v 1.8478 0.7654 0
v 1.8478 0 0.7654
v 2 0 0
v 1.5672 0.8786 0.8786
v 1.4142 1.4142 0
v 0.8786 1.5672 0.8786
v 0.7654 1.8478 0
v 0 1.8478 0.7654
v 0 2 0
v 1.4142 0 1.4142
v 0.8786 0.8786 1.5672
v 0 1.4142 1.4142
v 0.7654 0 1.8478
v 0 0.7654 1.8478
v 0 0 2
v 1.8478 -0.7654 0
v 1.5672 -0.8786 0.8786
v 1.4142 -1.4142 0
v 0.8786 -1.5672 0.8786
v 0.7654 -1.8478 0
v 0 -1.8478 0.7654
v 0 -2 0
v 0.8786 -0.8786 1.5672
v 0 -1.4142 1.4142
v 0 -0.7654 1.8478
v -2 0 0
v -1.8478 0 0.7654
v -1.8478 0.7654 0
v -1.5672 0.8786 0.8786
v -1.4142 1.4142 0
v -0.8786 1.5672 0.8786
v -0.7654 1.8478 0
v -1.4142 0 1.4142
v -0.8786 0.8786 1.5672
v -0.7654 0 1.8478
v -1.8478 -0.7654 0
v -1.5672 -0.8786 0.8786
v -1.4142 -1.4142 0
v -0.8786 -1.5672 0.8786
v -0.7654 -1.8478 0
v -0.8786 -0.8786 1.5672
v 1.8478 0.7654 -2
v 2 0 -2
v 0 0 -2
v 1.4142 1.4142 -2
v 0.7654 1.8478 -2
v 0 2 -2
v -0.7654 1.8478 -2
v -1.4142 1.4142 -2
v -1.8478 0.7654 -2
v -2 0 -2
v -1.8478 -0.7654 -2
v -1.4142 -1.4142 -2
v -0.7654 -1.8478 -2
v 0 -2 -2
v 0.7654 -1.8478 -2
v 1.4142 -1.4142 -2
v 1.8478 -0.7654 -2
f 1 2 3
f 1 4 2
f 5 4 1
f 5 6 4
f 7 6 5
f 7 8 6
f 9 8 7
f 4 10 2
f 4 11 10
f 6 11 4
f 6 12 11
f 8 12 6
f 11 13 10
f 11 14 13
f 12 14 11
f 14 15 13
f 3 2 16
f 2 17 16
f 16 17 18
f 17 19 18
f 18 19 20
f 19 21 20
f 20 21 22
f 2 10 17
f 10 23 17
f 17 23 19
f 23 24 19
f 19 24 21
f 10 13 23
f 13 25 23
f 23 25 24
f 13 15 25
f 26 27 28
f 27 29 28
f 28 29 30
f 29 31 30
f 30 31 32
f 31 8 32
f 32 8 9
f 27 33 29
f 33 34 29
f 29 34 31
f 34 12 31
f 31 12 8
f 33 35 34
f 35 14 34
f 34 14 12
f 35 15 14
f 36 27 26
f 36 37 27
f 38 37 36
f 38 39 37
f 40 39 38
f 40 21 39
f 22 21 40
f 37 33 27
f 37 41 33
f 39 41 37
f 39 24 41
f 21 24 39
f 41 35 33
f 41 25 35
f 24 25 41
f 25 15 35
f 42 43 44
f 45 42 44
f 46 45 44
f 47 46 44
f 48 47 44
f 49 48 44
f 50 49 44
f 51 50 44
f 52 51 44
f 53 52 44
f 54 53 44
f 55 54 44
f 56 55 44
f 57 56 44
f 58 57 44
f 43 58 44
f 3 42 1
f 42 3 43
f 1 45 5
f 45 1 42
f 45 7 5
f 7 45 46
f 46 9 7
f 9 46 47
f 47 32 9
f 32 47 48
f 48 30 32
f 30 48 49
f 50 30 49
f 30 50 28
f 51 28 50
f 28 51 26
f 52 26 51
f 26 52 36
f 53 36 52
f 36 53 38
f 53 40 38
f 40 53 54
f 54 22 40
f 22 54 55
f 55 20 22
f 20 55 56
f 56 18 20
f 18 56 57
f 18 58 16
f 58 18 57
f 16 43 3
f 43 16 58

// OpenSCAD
// file: ../p/1-8sphe.scad
use <../lib.scad>
function ldraw_lib__1_8sphe() = [
// 0 Sphere 0.125
// 0 Name: 1-8sphe.dat
// 0 Author: James Jessiman
// 0 !LDRAW_ORG Primitive UPDATE 2012-03
// 0 !LICENSE Licensed under CC BY 2.0 and CC BY 4.0 : see CAreadme.txt
// 
// 0 BFC CERTIFY CCW
  [0,"BFC","CERTIFY"],
  [0,"BFC","CCW"],
// 
// 0 !HISTORY 2000-08-01 {Axel Poque} fixes to resolve L3P error messages.
// 0 !HISTORY 2000-08-01 {Manfred Moolhuysen} fixes to resolve L3P error messages.
// 0 !HISTORY 2000-09-30 [PTadmin] Official Update 2000-02
// 0 !HISTORY 2002-03-28 [hafhead] Made BFC compliant
// 0 !HISTORY 2002-04-25 [PTadmin] Official Update 2002-02
// 0 !HISTORY 2007-06-22 [PTadmin] Header formatted for Contributor Agreement
// 0 !HISTORY 2008-07-01 [PTadmin] Official Update 2008-01
// 0 !HISTORY 2010-09-12 [MagFors] Changed winding, removed duplicated cond-line, optimized filesize
// 0 !HISTORY 2010-12-31 [PTadmin] Official Update 2010-03
// 0 !HISTORY 2012-07-01 [tcobbs] Replaced with geometry from LDView
// 0 !HISTORY 2012-12-28 [PTadmin] Official Update 2012-03
// 
// 
// 3 16 1 0 0 0.9239 0.3827 0 0.9239 0 0.3827
  [3,16,1,0,0,0.9239,0.3827,0,0.9239,0,0.3827],
// 3 16 0.9239 0.3827 0 0.7836 0.4393 0.4393 0.9239 0 0.3827
  [3,16,0.9239,0.3827,0,0.7836,0.4393,0.4393,0.9239,0,0.3827],
// 3 16 0.9239 0 0.3827 0.7836 0.4393 0.4393 0.7071 0 0.7071
  [3,16,0.9239,0,0.3827,0.7836,0.4393,0.4393,0.7071,0,0.7071],
// 3 16 0.7836 0.4393 0.4393 0.4393 0.4393 0.7836 0.7071 0 0.7071
  [3,16,0.7836,0.4393,0.4393,0.4393,0.4393,0.7836,0.7071,0,0.7071],
// 3 16 0.7071 0 0.7071 0.4393 0.4393 0.7836 0.3827 0 0.9239
  [3,16,0.7071,0,0.7071,0.4393,0.4393,0.7836,0.3827,0,0.9239],
// 3 16 0.4393 0.4393 0.7836 0 0.3827 0.9239 0.3827 0 0.9239
  [3,16,0.4393,0.4393,0.7836,0,0.3827,0.9239,0.3827,0,0.9239],
// 3 16 0.3827 0 0.9239 0 0.3827 0.9239 0 0 1
  [3,16,0.3827,0,0.9239,0,0.3827,0.9239,0,0,1],
// 3 16 0.9239 0.3827 0 0.7071 0.7071 0 0.7836 0.4393 0.4393
  [3,16,0.9239,0.3827,0,0.7071,0.7071,0,0.7836,0.4393,0.4393],
// 3 16 0.7071 0.7071 0 0.4393 0.7836 0.4393 0.7836 0.4393 0.4393
  [3,16,0.7071,0.7071,0,0.4393,0.7836,0.4393,0.7836,0.4393,0.4393],
// 3 16 0.7836 0.4393 0.4393 0.4393 0.7836 0.4393 0.4393 0.4393 0.7836
  [3,16,0.7836,0.4393,0.4393,0.4393,0.7836,0.4393,0.4393,0.4393,0.7836],
// 3 16 0.4393 0.7836 0.4393 0 0.7071 0.7071 0.4393 0.4393 0.7836
  [3,16,0.4393,0.7836,0.4393,0,0.7071,0.7071,0.4393,0.4393,0.7836],
// 3 16 0.4393 0.4393 0.7836 0 0.7071 0.7071 0 0.3827 0.9239
  [3,16,0.4393,0.4393,0.7836,0,0.7071,0.7071,0,0.3827,0.9239],
// 3 16 0.7071 0.7071 0 0.3827 0.9239 0 0.4393 0.7836 0.4393
  [3,16,0.7071,0.7071,0,0.3827,0.9239,0,0.4393,0.7836,0.4393],
// 3 16 0.3827 0.9239 0 0 0.9239 0.3827 0.4393 0.7836 0.4393
  [3,16,0.3827,0.9239,0,0,0.9239,0.3827,0.4393,0.7836,0.4393],
// 3 16 0.4393 0.7836 0.4393 0 0.9239 0.3827 0 0.7071 0.7071
  [3,16,0.4393,0.7836,0.4393,0,0.9239,0.3827,0,0.7071,0.7071],
// 3 16 0.3827 0.9239 0 0 1 0 0 0.9239 0.3827
  [3,16,0.3827,0.9239,0,0,1,0,0,0.9239,0.3827],
// 
// 5 24 1 0 0 0.9239 0.3827 0 1 0 -0.1 0.9239 0 0.3827
  [5,24,1,0,0,0.9239,0.3827,0,1,0,-0.1,0.9239,0,0.3827],
// 5 24 0.9239 0.3827 0 0.9239 0 0.3827 1 0 0 0.7836 0.4393 0.4393
  [5,24,0.9239,0.3827,0,0.9239,0,0.3827,1,0,0,0.7836,0.4393,0.4393],
// 5 24 1 0 0 0.9239 0 0.3827 0.9239 0.3827 0 1 -0.1 0
  [5,24,1,0,0,0.9239,0,0.3827,0.9239,0.3827,0,1,-0.1,0],
// 5 24 0.9239 0 0.3827 0.7836 0.4393 0.4393 0.9239 0.3827 0 0.7071 0 0.7071
  [5,24,0.9239,0,0.3827,0.7836,0.4393,0.4393,0.9239,0.3827,0,0.7071,0,0.7071],
// 5 24 0.7836 0.4393 0.4393 0.7071 0 0.7071 0.9239 0 0.3827 0.4393 0.4393 0.7836
  [5,24,0.7836,0.4393,0.4393,0.7071,0,0.7071,0.9239,0,0.3827,0.4393,0.4393,0.7836],
// 5 24 0.9239 0 0.3827 0.7071 0 0.7071 0.7836 0.4393 0.4393 0.9239 -0.1 0.3827
  [5,24,0.9239,0,0.3827,0.7071,0,0.7071,0.7836,0.4393,0.4393,0.9239,-0.1,0.3827],
// 5 24 0.7071 0 0.7071 0.4393 0.4393 0.7836 0.7836 0.4393 0.4393 0.3827 0 0.9239
  [5,24,0.7071,0,0.7071,0.4393,0.4393,0.7836,0.7836,0.4393,0.4393,0.3827,0,0.9239],
// 5 24 0.4393 0.4393 0.7836 0.3827 0 0.9239 0.7071 0 0.7071 0 0.3827 0.9239
  [5,24,0.4393,0.4393,0.7836,0.3827,0,0.9239,0.7071,0,0.7071,0,0.3827,0.9239],
// 5 24 0.7071 0 0.7071 0.3827 0 0.9239 0.4393 0.4393 0.7836 0.7071 -0.1 0.7071
  [5,24,0.7071,0,0.7071,0.3827,0,0.9239,0.4393,0.4393,0.7836,0.7071,-0.1,0.7071],
// 5 24 0.3827 0 0.9239 0 0.3827 0.9239 0.4393 0.4393 0.7836 0 0 1
  [5,24,0.3827,0,0.9239,0,0.3827,0.9239,0.4393,0.4393,0.7836,0,0,1],
// 5 24 0 0.3827 0.9239 0 0 1 0.3827 0 0.9239 -0.1 0.3827 0.9239
  [5,24,0,0.3827,0.9239,0,0,1,0.3827,0,0.9239,-0.1,0.3827,0.9239],
// 5 24 0.3827 0 0.9239 0 0 1 0 0.3827 0.9239 0.3827 -0.1 0.9239
  [5,24,0.3827,0,0.9239,0,0,1,0,0.3827,0.9239,0.3827,-0.1,0.9239],
// 5 24 0.9239 0.3827 0 0.7071 0.7071 0 0.9239 0.3827 -0.1 0.7836 0.4393 0.4393
  [5,24,0.9239,0.3827,0,0.7071,0.7071,0,0.9239,0.3827,-0.1,0.7836,0.4393,0.4393],
// 5 24 0.7071 0.7071 0 0.7836 0.4393 0.4393 0.9239 0.3827 0 0.4393 0.7836 0.4393
  [5,24,0.7071,0.7071,0,0.7836,0.4393,0.4393,0.9239,0.3827,0,0.4393,0.7836,0.4393],
// 5 24 0.9239 0.3827 0 0.7836 0.4393 0.4393 0.7071 0.7071 0 0.9239 0 0.3827
  [5,24,0.9239,0.3827,0,0.7836,0.4393,0.4393,0.7071,0.7071,0,0.9239,0,0.3827],
// 5 24 0.7836 0.4393 0.4393 0.4393 0.7836 0.4393 0.7071 0.7071 0 0.4393 0.4393 0.7836
  [5,24,0.7836,0.4393,0.4393,0.4393,0.7836,0.4393,0.7071,0.7071,0,0.4393,0.4393,0.7836],
// 5 24 0.4393 0.7836 0.4393 0.4393 0.4393 0.7836 0.7836 0.4393 0.4393 0 0.7071 0.7071
  [5,24,0.4393,0.7836,0.4393,0.4393,0.4393,0.7836,0.7836,0.4393,0.4393,0,0.7071,0.7071],
// 5 24 0.7836 0.4393 0.4393 0.4393 0.4393 0.7836 0.4393 0.7836 0.4393 0.7071 0 0.7071
  [5,24,0.7836,0.4393,0.4393,0.4393,0.4393,0.7836,0.4393,0.7836,0.4393,0.7071,0,0.7071],
// 5 24 0.4393 0.4393 0.7836 0 0.7071 0.7071 0.4393 0.7836 0.4393 0 0.3827 0.9239
  [5,24,0.4393,0.4393,0.7836,0,0.7071,0.7071,0.4393,0.7836,0.4393,0,0.3827,0.9239],
// 5 24 0 0.7071 0.7071 0 0.3827 0.9239 0.4393 0.4393 0.7836 -0.1 0.7071 0.7071
  [5,24,0,0.7071,0.7071,0,0.3827,0.9239,0.4393,0.4393,0.7836,-0.1,0.7071,0.7071],
// 5 24 0.4393 0.4393 0.7836 0 0.3827 0.9239 0 0.7071 0.7071 0.3827 0 0.9239
  [5,24,0.4393,0.4393,0.7836,0,0.3827,0.9239,0,0.7071,0.7071,0.3827,0,0.9239],
// 5 24 0.7071 0.7071 0 0.3827 0.9239 0 0.7071 0.7071 -0.1 0.4393 0.7836 0.4393
  [5,24,0.7071,0.7071,0,0.3827,0.9239,0,0.7071,0.7071,-0.1,0.4393,0.7836,0.4393],
// 5 24 0.3827 0.9239 0 0.4393 0.7836 0.4393 0.7071 0.7071 0 0 0.9239 0.3827
  [5,24,0.3827,0.9239,0,0.4393,0.7836,0.4393,0.7071,0.7071,0,0,0.9239,0.3827],
// 5 24 0.7071 0.7071 0 0.4393 0.7836 0.4393 0.3827 0.9239 0 0.7836 0.4393 0.4393
  [5,24,0.7071,0.7071,0,0.4393,0.7836,0.4393,0.3827,0.9239,0,0.7836,0.4393,0.4393],
// 5 24 0.4393 0.7836 0.4393 0 0.9239 0.3827 0.3827 0.9239 0 0 0.7071 0.7071
  [5,24,0.4393,0.7836,0.4393,0,0.9239,0.3827,0.3827,0.9239,0,0,0.7071,0.7071],
// 5 24 0 0.9239 0.3827 0 0.7071 0.7071 0.4393 0.7836 0.4393 -0.1 0.9239 0.3827
  [5,24,0,0.9239,0.3827,0,0.7071,0.7071,0.4393,0.7836,0.4393,-0.1,0.9239,0.3827],
// 5 24 0.4393 0.7836 0.4393 0 0.7071 0.7071 0 0.9239 0.3827 0.4393 0.4393 0.7836
  [5,24,0.4393,0.7836,0.4393,0,0.7071,0.7071,0,0.9239,0.3827,0.4393,0.4393,0.7836],
// 5 24 0.3827 0.9239 0 0 1 0 0.3827 0.9239 -0.1 0 0.9239 0.3827
  [5,24,0.3827,0.9239,0,0,1,0,0.3827,0.9239,-0.1,0,0.9239,0.3827],
// 5 24 0 1 0 0 0.9239 0.3827 0.3827 0.9239 0 -0.1 1 0
  [5,24,0,1,0,0,0.9239,0.3827,0.3827,0.9239,0,-0.1,1,0],
// 5 24 0.3827 0.9239 0 0 0.9239 0.3827 0 1 0 0.4393 0.7836 0.4393
  [5,24,0.3827,0.9239,0,0,0.9239,0.3827,0,1,0,0.4393,0.7836,0.4393],
];
module ldraw_lib__1_8sphe(step=0, col=false, unit=2/5, alt=false, line=0.2, solid=!$preview)
    makepoly(ldraw_lib__1_8sphe(), step=step, col=col, unit=unit, alt=alt, line=line, solid=solid);
ldraw_lib__1_8sphe(line=0.2);
// file: ../p/4-8sphe.scad
use <../lib.scad>
use <1-8sphe.scad>
function ldraw_lib__4_8sphe() = [
// 0 Sphere 0.5
// 0 Name: 4-8sphe.dat
// 0 Author: James Jessiman
// 0 !LDRAW_ORG Primitive UPDATE 2003-02
// 0 !LICENSE Licensed under CC BY 2.0 and CC BY 4.0 : see CAreadme.txt
// 
// 0 BFC CERTIFY CCW
  [0,"BFC","CERTIFY"],
  [0,"BFC","CCW"],
// 
// 0 !HISTORY 2002-08-31 [izanette] Modified with WINDZ for BFC compliance
// 0 !HISTORY 2003-08-01 [PTadmin] Official Update 2003-02
// 0 !HISTORY 2007-06-24 [PTadmin] Header formatted for Contributor Agreement
// 0 !HISTORY 2008-07-01 [PTadmin] Official Update 2008-01
// 
// 
// 1 16 0 0 0 1 0 0 0 1 0 0 0 1 1-8sphe.dat
  [1,16,0,0,0,1,0,0,0,1,0,0,0,1, ldraw_lib__1_8sphe()],
// 1 16 0 0 0 1 0 0 0 1 0 0 0 -1 1-8sphe.dat
  [1,16,0,0,0,1,0,0,0,1,0,0,0,-1, ldraw_lib__1_8sphe()],
// 1 16 0 0 0 -1 0 0 0 1 0 0 0 1 1-8sphe.dat
  [1,16,0,0,0,-1,0,0,0,1,0,0,0,1, ldraw_lib__1_8sphe()],
// 1 16 0 0 0 -1 0 0 0 1 0 0 0 -1 1-8sphe.dat
  [1,16,0,0,0,-1,0,0,0,1,0,0,0,-1, ldraw_lib__1_8sphe()],
// 0
// 
];
module ldraw_lib__4_8sphe(step=0, col=false, unit=2/5, alt=false, line=0.2, solid=!$preview)
    makepoly(ldraw_lib__4_8sphe(), step=step, col=col, unit=unit, alt=alt, line=line, solid=solid);
ldraw_lib__4_8sphe(line=0.2);
// file: ../p/4-4edge.scad
use <../lib.scad>
function ldraw_lib__4_4edge() = [
// 0 Circle 1.0
// 0 Name: 4-4edge.dat
// 0 Author: James Jessiman
// 0 !LDRAW_ORG Primitive UPDATE 2017-01
// 0 !LICENSE Licensed under CC BY 4.0 : see CAreadme.txt
// 
// 0 BFC CERTIFY CCW
  [0,"BFC","CERTIFY"],
  [0,"BFC","CCW"],
// 
// 0 !HISTORY 1998-12-15 [PTadmin] Official Update 1998-10
// 0 !HISTORY 2005-12-28 [PTadmin] Official Update 2005-01
// 0 !HISTORY 2007-06-24 [PTadmin] Header formatted for Contributor Agreement
// 0 !HISTORY 2008-07-01 [PTadmin] Official Update 2008-01
// 0 !HISTORY 2017-01-15 [Steffen] BFCed
// 0 !HISTORY 2017-12-30 [PTadmin] Official Update 2017-01
// 
// 
// 2 24 1 0 0 0.9239 0 0.3827
  [2,24,1,0,0,0.9239,0,0.3827],
// 2 24 0.9239 0 0.3827 0.7071 0 0.7071
  [2,24,0.9239,0,0.3827,0.7071,0,0.7071],
// 2 24 0.7071 0 0.7071 0.3827 0 0.9239
  [2,24,0.7071,0,0.7071,0.3827,0,0.9239],
// 2 24 0.3827 0 0.9239 0 0 1
  [2,24,0.3827,0,0.9239,0,0,1],
// 2 24 0 0 1 -0.3827 0 0.9239
  [2,24,0,0,1,-0.3827,0,0.9239],
// 2 24 -0.3827 0 0.9239 -0.7071 0 0.7071
  [2,24,-0.3827,0,0.9239,-0.7071,0,0.7071],
// 2 24 -0.7071 0 0.7071 -0.9239 0 0.3827
  [2,24,-0.7071,0,0.7071,-0.9239,0,0.3827],
// 2 24 -0.9239 0 0.3827 -1 0 -0
  [2,24,-0.9239,0,0.3827,-1,0,-0],
// 2 24 -1 0 -0 -0.9239 0 -0.3827
  [2,24,-1,0,-0,-0.9239,0,-0.3827],
// 2 24 -0.9239 0 -0.3827 -0.7071 0 -0.7071
  [2,24,-0.9239,0,-0.3827,-0.7071,0,-0.7071],
// 2 24 -0.7071 0 -0.7071 -0.3827 0 -0.9239
  [2,24,-0.7071,0,-0.7071,-0.3827,0,-0.9239],
// 2 24 -0.3827 0 -0.9239 0 0 -1
  [2,24,-0.3827,0,-0.9239,0,0,-1],
// 2 24 0 0 -1 0.3827 0 -0.9239
  [2,24,0,0,-1,0.3827,0,-0.9239],
// 2 24 0.3827 0 -0.9239 0.7071 0 -0.7071
  [2,24,0.3827,0,-0.9239,0.7071,0,-0.7071],
// 2 24 0.7071 0 -0.7071 0.9239 0 -0.3827
  [2,24,0.7071,0,-0.7071,0.9239,0,-0.3827],
// 2 24 0.9239 0 -0.3827 1 0 0
  [2,24,0.9239,0,-0.3827,1,0,0],
];
module ldraw_lib__4_4edge(step=0, col=false, unit=2/5, alt=false, line=0.2, solid=!$preview)
    makepoly(ldraw_lib__4_4edge(), step=step, col=col, unit=unit, alt=alt, line=line, solid=solid);
ldraw_lib__4_4edge(line=0.2);
// file: ../p/4-4disc.scad
use <../lib.scad>
function ldraw_lib__4_4disc() = [
// 0 Disc 1.0
// 0 Name: 4-4disc.dat
// 0 Author: James Jessiman
// 0 !LDRAW_ORG Primitive UPDATE 2002-02
// 0 !LICENSE Licensed under CC BY 4.0 : see CAreadme.txt
// 
// 0 BFC CERTIFY CCW
  [0,"BFC","CERTIFY"],
  [0,"BFC","CCW"],
// 
// 0 !HISTORY 1998-12-15 [PTadmin] Official Update 1998-10
// 0 !HISTORY 2002-03-23 [sbliss] Added BFC statement
// 0 !HISTORY 2002-04-25 [PTadmin] Official Update 2002-02
// 0 !HISTORY 2007-06-24 [PTadmin] Header formatted for Contributor Agreement
// 0 !HISTORY 2008-07-01 [PTadmin] Official Update 2008-01
// 
// 
// 3 16 0 0 0 1 0 0 0.9239 0 0.3827
  [3,16,0,0,0,1,0,0,0.9239,0,0.3827],
// 3 16 0 0 0 0.9239 0 0.3827 0.7071 0 0.7071
  [3,16,0,0,0,0.9239,0,0.3827,0.7071,0,0.7071],
// 3 16 0 0 0 0.7071 0 0.7071 0.3827 0 0.9239
  [3,16,0,0,0,0.7071,0,0.7071,0.3827,0,0.9239],
// 3 16 0 0 0 0.3827 0 0.9239 0 0 1
  [3,16,0,0,0,0.3827,0,0.9239,0,0,1],
// 3 16 0 0 0 0 0 1 -0.3827 0 0.9239
  [3,16,0,0,0,0,0,1,-0.3827,0,0.9239],
// 3 16 0 0 0 -0.3827 0 0.9239 -0.7071 0 0.7071
  [3,16,0,0,0,-0.3827,0,0.9239,-0.7071,0,0.7071],
// 3 16 0 0 0 -0.7071 0 0.7071 -0.9239 0 0.3827
  [3,16,0,0,0,-0.7071,0,0.7071,-0.9239,0,0.3827],
// 3 16 0 0 0 -0.9239 0 0.3827 -1 0 -0
  [3,16,0,0,0,-0.9239,0,0.3827,-1,0,-0],
// 3 16 0 0 0 -1 0 -0 -0.9239 0 -0.3827
  [3,16,0,0,0,-1,0,-0,-0.9239,0,-0.3827],
// 3 16 0 0 0 -0.9239 0 -0.3827 -0.7071 0 -0.7071
  [3,16,0,0,0,-0.9239,0,-0.3827,-0.7071,0,-0.7071],
// 3 16 0 0 0 -0.7071 0 -0.7071 -0.3827 0 -0.9239
  [3,16,0,0,0,-0.7071,0,-0.7071,-0.3827,0,-0.9239],
// 3 16 0 0 0 -0.3827 0 -0.9239 0 0 -1
  [3,16,0,0,0,-0.3827,0,-0.9239,0,0,-1],
// 3 16 0 0 0 0 0 -1 0.3827 0 -0.9239
  [3,16,0,0,0,0,0,-1,0.3827,0,-0.9239],
// 3 16 0 0 0 0.3827 0 -0.9239 0.7071 0 -0.7071
  [3,16,0,0,0,0.3827,0,-0.9239,0.7071,0,-0.7071],
// 3 16 0 0 0 0.7071 0 -0.7071 0.9239 0 -0.3827
  [3,16,0,0,0,0.7071,0,-0.7071,0.9239,0,-0.3827],
// 3 16 0 0 0 0.9239 0 -0.3827 1 0 0
  [3,16,0,0,0,0.9239,0,-0.3827,1,0,0],
// 0
];
module ldraw_lib__4_4disc(step=0, col=false, unit=2/5, alt=false, line=0.2, solid=!$preview)
    makepoly(ldraw_lib__4_4disc(), step=step, col=col, unit=unit, alt=alt, line=line, solid=solid);
ldraw_lib__4_4disc(line=0.2);
// file: ../p/4-4cyli.scad
use <../lib.scad>
function ldraw_lib__4_4cyli() = [
// 0 Cylinder 1.0
// 0 Name: 4-4cyli.dat
// 0 Author: James Jessiman
// 0 !LDRAW_ORG Primitive UPDATE 2005-01
// 0 !LICENSE Licensed under CC BY 2.0 and CC BY 4.0 : see CAreadme.txt
// 
// 0 BFC CERTIFY CCW
  [0,"BFC","CERTIFY"],
  [0,"BFC","CCW"],
// 
// 0 !HISTORY 1998-12-15 [PTadmin] Official Update 1998-10
// 0 !HISTORY 2002-03-23 [sbliss] Added BFC statement; merged headers from files in distributions LDraw 0.27 and Complete.
// 0 !HISTORY 2002-04-25 [PTadmin] Official Update 2002-02
// 0 !HISTORY 2004-12-14 [guyvivan] BFC CCW
// 0 !HISTORY 2005-12-28 [PTadmin] Official Update 2005-01
// 0 !HISTORY 2007-06-24 [PTadmin] Header formatted for Contributor Agreement
// 0 !HISTORY 2008-07-01 [PTadmin] Official Update 2008-01
// 
// 
// 4 16 1 1 0 0.9239 1 0.3827 0.9239 0 0.3827 1 0 0
  [4,16,1,1,0,0.9239,1,0.3827,0.9239,0,0.3827,1,0,0],
// 5 24 1 0 0 1 1 0 0.9239 0 0.3827 0.9239 0 -0.3827
  [5,24,1,0,0,1,1,0,0.9239,0,0.3827,0.9239,0,-0.3827],
// 4 16 0.9239 1 0.3827 0.7071 1 0.7071 0.7071 0 0.7071 0.9239 0 0.3827
  [4,16,0.9239,1,0.3827,0.7071,1,0.7071,0.7071,0,0.7071,0.9239,0,0.3827],
// 5 24 0.9239 0 0.3827 0.9239 1 0.3827 0.7071 0 0.7071 1 0 0
  [5,24,0.9239,0,0.3827,0.9239,1,0.3827,0.7071,0,0.7071,1,0,0],
// 4 16 0.7071 1 0.7071 0.3827 1 0.9239 0.3827 0 0.9239 0.7071 0 0.7071
  [4,16,0.7071,1,0.7071,0.3827,1,0.9239,0.3827,0,0.9239,0.7071,0,0.7071],
// 5 24 0.7071 0 0.7071 0.7071 1 0.7071 0.3827 0 0.9239 0.9239 0 0.3827
  [5,24,0.7071,0,0.7071,0.7071,1,0.7071,0.3827,0,0.9239,0.9239,0,0.3827],
// 4 16 0.3827 1 0.9239 0 1 1 0 0 1 0.3827 0 0.9239
  [4,16,0.3827,1,0.9239,0,1,1,0,0,1,0.3827,0,0.9239],
// 5 24 0.3827 0 0.9239 0.3827 1 0.9239 0 0 1 0.7071 0 0.7071
  [5,24,0.3827,0,0.9239,0.3827,1,0.9239,0,0,1,0.7071,0,0.7071],
// 4 16 0 1 1 -0.3827 1 0.9239 -0.3827 0 0.9239 0 0 1
  [4,16,0,1,1,-0.3827,1,0.9239,-0.3827,0,0.9239,0,0,1],
// 5 24 0 0 1 0 1 1 -0.3827 0 0.9239 0.3827 0 0.9239
  [5,24,0,0,1,0,1,1,-0.3827,0,0.9239,0.3827,0,0.9239],
// 4 16 -0.3827 1 0.9239 -0.7071 1 0.7071 -0.7071 0 0.7071 -0.3827 0 0.9239
  [4,16,-0.3827,1,0.9239,-0.7071,1,0.7071,-0.7071,0,0.7071,-0.3827,0,0.9239],
// 5 24 -0.3827 0 0.9239 -0.3827 1 0.9239 -0.7071 0 0.7071 0 0 1
  [5,24,-0.3827,0,0.9239,-0.3827,1,0.9239,-0.7071,0,0.7071,0,0,1],
// 4 16 -0.7071 1 0.7071 -0.9239 1 0.3827 -0.9239 0 0.3827 -0.7071 0 0.7071
  [4,16,-0.7071,1,0.7071,-0.9239,1,0.3827,-0.9239,0,0.3827,-0.7071,0,0.7071],
// 5 24 -0.7071 0 0.7071 -0.7071 1 0.7071 -0.9239 0 0.3827 -0.3827 0 0.9239
  [5,24,-0.7071,0,0.7071,-0.7071,1,0.7071,-0.9239,0,0.3827,-0.3827,0,0.9239],
// 4 16 -0.9239 1 0.3827 -1 1 0 -1 0 0 -0.9239 0 0.3827
  [4,16,-0.9239,1,0.3827,-1,1,0,-1,0,0,-0.9239,0,0.3827],
// 5 24 -0.9239 0 0.3827 -0.9239 1 0.3827 -1 0 0 -0.7071 0 0.7071
  [5,24,-0.9239,0,0.3827,-0.9239,1,0.3827,-1,0,0,-0.7071,0,0.7071],
// 4 16 -1 1 0 -0.9239 1 -0.3827 -0.9239 0 -0.3827 -1 0 0
  [4,16,-1,1,0,-0.9239,1,-0.3827,-0.9239,0,-0.3827,-1,0,0],
// 5 24 -1 0 0 -1 1 0 -0.9239 0 -0.3827 -0.9239 0 0.3827
  [5,24,-1,0,0,-1,1,0,-0.9239,0,-0.3827,-0.9239,0,0.3827],
// 4 16 -0.9239 1 -0.3827 -0.7071 1 -0.7071 -0.7071 0 -0.7071 -0.9239 0 -0.3827
  [4,16,-0.9239,1,-0.3827,-0.7071,1,-0.7071,-0.7071,0,-0.7071,-0.9239,0,-0.3827],
// 5 24 -0.9239 0 -0.3827 -0.9239 1 -0.3827 -0.7071 0 -0.7071 -1 0 0
  [5,24,-0.9239,0,-0.3827,-0.9239,1,-0.3827,-0.7071,0,-0.7071,-1,0,0],
// 4 16 -0.7071 1 -0.7071 -0.3827 1 -0.9239 -0.3827 0 -0.9239 -0.7071 0 -0.7071
  [4,16,-0.7071,1,-0.7071,-0.3827,1,-0.9239,-0.3827,0,-0.9239,-0.7071,0,-0.7071],
// 5 24 -0.7071 0 -0.7071 -0.7071 1 -0.7071 -0.3827 0 -0.9239 -0.9239 0 -0.3827
  [5,24,-0.7071,0,-0.7071,-0.7071,1,-0.7071,-0.3827,0,-0.9239,-0.9239,0,-0.3827],
// 4 16 -0.3827 1 -0.9239 0 1 -1 0 0 -1 -0.3827 0 -0.9239
  [4,16,-0.3827,1,-0.9239,0,1,-1,0,0,-1,-0.3827,0,-0.9239],
// 5 24 -0.3827 0 -0.9239 -0.3827 1 -0.9239 0 0 -1 -0.7071 0 -0.7071
  [5,24,-0.3827,0,-0.9239,-0.3827,1,-0.9239,0,0,-1,-0.7071,0,-0.7071],
// 4 16 0 1 -1 0.3827 1 -0.9239 0.3827 0 -0.9239 0 0 -1
  [4,16,0,1,-1,0.3827,1,-0.9239,0.3827,0,-0.9239,0,0,-1],
// 5 24 0 0 -1 0 1 -1 0.3827 0 -0.9239 -0.3827 0 -0.9239
  [5,24,0,0,-1,0,1,-1,0.3827,0,-0.9239,-0.3827,0,-0.9239],
// 4 16 0.3827 1 -0.9239 0.7071 1 -0.7071 0.7071 0 -0.7071 0.3827 0 -0.9239
  [4,16,0.3827,1,-0.9239,0.7071,1,-0.7071,0.7071,0,-0.7071,0.3827,0,-0.9239],
// 5 24 0.3827 0 -0.9239 0.3827 1 -0.9239 0.7071 0 -0.7071 0 0 -1
  [5,24,0.3827,0,-0.9239,0.3827,1,-0.9239,0.7071,0,-0.7071,0,0,-1],
// 4 16 0.7071 1 -0.7071 0.9239 1 -0.3827 0.9239 0 -0.3827 0.7071 0 -0.7071
  [4,16,0.7071,1,-0.7071,0.9239,1,-0.3827,0.9239,0,-0.3827,0.7071,0,-0.7071],
// 5 24 0.7071 0 -0.7071 0.7071 1 -0.7071 0.9239 0 -0.3827 0.3827 0 -0.9239
  [5,24,0.7071,0,-0.7071,0.7071,1,-0.7071,0.9239,0,-0.3827,0.3827,0,-0.9239],
// 4 16 0.9239 1 -0.3827 1 1 0 1 0 0 0.9239 0 -0.3827
  [4,16,0.9239,1,-0.3827,1,1,0,1,0,0,0.9239,0,-0.3827],
// 5 24 0.9239 0 -0.3827 0.9239 1 -0.3827 1 0 0 0.7071 0 -0.7071
  [5,24,0.9239,0,-0.3827,0.9239,1,-0.3827,1,0,0,0.7071,0,-0.7071],
// 0
];
module ldraw_lib__4_4cyli(step=0, col=false, unit=2/5, alt=false, line=0.2, solid=!$preview)
    makepoly(ldraw_lib__4_4cyli(), step=step, col=col, unit=unit, alt=alt, line=line, solid=solid);
ldraw_lib__4_4cyli(line=0.2);
// main file
use <../lib.scad>
use <../p/4-4cyli.scad>
use <../p/4-4disc.scad>
use <../p/4-4edge.scad>
use <../p/4-8sphe.scad>
function ldraw_lib__334() = [
// 0 ~Technic Micro-Scout Button (Needs Work)
// 0 Name: 334.dat
// 0 Author: Marc Klein [marckl]
// 0 !LDRAW_ORG Part UPDATE 2019-03
// 0 !LICENSE Licensed under CC BY 4.0 : see CAreadme.txt
// 
// 0 BFC CERTIFY CCW
  [0,"BFC","CERTIFY"],
  [0,"BFC","CCW"],
// 
// 0 !HISTORY 2012-03-30 [PTadmin] Official Update 2012-01
// 0 !HISTORY 2017-08-12 [MagFors] bfc'd
// 0 !HISTORY 2019-12-27 [PTadmin] Official Update 2019-03
// 
// 
// 0 // Needs work. Only the visible section has been modelised.
// 
// 1 16 0 0 0 5 0 0 0 -5 0 0 0 5 4-8sphe.dat
  [1,16,0,0,0,5,0,0,0,-5,0,0,0,5, ldraw_lib__4_8sphe()],
// 1 16 0 5 0 5 0 0 0 1 0 0 0 5 4-4edge.dat
  [1,16,0,5,0,5,0,0,0,1,0,0,0,5, ldraw_lib__4_4edge()],
// 1 16 0 5 0 5 0 0 0 -5 0 0 0 5 4-4disc.dat
  [1,16,0,5,0,5,0,0,0,-5,0,0,0,5, ldraw_lib__4_4disc()],
// 1 16 0 0 0 5 0 0 0 5 0 0 0 5 4-4cyli.dat
  [1,16,0,0,0,5,0,0,0,5,0,0,0,5, ldraw_lib__4_4cyli()],
];
module ldraw_lib__334(step=0, col=false, unit=2/5, alt=false, line=0.2, solid=!$preview)
    makepoly(ldraw_lib__334(), step=step, col=col, unit=unit, alt=alt, line=line, solid=solid);
ldraw_lib__334(line=0.2);
